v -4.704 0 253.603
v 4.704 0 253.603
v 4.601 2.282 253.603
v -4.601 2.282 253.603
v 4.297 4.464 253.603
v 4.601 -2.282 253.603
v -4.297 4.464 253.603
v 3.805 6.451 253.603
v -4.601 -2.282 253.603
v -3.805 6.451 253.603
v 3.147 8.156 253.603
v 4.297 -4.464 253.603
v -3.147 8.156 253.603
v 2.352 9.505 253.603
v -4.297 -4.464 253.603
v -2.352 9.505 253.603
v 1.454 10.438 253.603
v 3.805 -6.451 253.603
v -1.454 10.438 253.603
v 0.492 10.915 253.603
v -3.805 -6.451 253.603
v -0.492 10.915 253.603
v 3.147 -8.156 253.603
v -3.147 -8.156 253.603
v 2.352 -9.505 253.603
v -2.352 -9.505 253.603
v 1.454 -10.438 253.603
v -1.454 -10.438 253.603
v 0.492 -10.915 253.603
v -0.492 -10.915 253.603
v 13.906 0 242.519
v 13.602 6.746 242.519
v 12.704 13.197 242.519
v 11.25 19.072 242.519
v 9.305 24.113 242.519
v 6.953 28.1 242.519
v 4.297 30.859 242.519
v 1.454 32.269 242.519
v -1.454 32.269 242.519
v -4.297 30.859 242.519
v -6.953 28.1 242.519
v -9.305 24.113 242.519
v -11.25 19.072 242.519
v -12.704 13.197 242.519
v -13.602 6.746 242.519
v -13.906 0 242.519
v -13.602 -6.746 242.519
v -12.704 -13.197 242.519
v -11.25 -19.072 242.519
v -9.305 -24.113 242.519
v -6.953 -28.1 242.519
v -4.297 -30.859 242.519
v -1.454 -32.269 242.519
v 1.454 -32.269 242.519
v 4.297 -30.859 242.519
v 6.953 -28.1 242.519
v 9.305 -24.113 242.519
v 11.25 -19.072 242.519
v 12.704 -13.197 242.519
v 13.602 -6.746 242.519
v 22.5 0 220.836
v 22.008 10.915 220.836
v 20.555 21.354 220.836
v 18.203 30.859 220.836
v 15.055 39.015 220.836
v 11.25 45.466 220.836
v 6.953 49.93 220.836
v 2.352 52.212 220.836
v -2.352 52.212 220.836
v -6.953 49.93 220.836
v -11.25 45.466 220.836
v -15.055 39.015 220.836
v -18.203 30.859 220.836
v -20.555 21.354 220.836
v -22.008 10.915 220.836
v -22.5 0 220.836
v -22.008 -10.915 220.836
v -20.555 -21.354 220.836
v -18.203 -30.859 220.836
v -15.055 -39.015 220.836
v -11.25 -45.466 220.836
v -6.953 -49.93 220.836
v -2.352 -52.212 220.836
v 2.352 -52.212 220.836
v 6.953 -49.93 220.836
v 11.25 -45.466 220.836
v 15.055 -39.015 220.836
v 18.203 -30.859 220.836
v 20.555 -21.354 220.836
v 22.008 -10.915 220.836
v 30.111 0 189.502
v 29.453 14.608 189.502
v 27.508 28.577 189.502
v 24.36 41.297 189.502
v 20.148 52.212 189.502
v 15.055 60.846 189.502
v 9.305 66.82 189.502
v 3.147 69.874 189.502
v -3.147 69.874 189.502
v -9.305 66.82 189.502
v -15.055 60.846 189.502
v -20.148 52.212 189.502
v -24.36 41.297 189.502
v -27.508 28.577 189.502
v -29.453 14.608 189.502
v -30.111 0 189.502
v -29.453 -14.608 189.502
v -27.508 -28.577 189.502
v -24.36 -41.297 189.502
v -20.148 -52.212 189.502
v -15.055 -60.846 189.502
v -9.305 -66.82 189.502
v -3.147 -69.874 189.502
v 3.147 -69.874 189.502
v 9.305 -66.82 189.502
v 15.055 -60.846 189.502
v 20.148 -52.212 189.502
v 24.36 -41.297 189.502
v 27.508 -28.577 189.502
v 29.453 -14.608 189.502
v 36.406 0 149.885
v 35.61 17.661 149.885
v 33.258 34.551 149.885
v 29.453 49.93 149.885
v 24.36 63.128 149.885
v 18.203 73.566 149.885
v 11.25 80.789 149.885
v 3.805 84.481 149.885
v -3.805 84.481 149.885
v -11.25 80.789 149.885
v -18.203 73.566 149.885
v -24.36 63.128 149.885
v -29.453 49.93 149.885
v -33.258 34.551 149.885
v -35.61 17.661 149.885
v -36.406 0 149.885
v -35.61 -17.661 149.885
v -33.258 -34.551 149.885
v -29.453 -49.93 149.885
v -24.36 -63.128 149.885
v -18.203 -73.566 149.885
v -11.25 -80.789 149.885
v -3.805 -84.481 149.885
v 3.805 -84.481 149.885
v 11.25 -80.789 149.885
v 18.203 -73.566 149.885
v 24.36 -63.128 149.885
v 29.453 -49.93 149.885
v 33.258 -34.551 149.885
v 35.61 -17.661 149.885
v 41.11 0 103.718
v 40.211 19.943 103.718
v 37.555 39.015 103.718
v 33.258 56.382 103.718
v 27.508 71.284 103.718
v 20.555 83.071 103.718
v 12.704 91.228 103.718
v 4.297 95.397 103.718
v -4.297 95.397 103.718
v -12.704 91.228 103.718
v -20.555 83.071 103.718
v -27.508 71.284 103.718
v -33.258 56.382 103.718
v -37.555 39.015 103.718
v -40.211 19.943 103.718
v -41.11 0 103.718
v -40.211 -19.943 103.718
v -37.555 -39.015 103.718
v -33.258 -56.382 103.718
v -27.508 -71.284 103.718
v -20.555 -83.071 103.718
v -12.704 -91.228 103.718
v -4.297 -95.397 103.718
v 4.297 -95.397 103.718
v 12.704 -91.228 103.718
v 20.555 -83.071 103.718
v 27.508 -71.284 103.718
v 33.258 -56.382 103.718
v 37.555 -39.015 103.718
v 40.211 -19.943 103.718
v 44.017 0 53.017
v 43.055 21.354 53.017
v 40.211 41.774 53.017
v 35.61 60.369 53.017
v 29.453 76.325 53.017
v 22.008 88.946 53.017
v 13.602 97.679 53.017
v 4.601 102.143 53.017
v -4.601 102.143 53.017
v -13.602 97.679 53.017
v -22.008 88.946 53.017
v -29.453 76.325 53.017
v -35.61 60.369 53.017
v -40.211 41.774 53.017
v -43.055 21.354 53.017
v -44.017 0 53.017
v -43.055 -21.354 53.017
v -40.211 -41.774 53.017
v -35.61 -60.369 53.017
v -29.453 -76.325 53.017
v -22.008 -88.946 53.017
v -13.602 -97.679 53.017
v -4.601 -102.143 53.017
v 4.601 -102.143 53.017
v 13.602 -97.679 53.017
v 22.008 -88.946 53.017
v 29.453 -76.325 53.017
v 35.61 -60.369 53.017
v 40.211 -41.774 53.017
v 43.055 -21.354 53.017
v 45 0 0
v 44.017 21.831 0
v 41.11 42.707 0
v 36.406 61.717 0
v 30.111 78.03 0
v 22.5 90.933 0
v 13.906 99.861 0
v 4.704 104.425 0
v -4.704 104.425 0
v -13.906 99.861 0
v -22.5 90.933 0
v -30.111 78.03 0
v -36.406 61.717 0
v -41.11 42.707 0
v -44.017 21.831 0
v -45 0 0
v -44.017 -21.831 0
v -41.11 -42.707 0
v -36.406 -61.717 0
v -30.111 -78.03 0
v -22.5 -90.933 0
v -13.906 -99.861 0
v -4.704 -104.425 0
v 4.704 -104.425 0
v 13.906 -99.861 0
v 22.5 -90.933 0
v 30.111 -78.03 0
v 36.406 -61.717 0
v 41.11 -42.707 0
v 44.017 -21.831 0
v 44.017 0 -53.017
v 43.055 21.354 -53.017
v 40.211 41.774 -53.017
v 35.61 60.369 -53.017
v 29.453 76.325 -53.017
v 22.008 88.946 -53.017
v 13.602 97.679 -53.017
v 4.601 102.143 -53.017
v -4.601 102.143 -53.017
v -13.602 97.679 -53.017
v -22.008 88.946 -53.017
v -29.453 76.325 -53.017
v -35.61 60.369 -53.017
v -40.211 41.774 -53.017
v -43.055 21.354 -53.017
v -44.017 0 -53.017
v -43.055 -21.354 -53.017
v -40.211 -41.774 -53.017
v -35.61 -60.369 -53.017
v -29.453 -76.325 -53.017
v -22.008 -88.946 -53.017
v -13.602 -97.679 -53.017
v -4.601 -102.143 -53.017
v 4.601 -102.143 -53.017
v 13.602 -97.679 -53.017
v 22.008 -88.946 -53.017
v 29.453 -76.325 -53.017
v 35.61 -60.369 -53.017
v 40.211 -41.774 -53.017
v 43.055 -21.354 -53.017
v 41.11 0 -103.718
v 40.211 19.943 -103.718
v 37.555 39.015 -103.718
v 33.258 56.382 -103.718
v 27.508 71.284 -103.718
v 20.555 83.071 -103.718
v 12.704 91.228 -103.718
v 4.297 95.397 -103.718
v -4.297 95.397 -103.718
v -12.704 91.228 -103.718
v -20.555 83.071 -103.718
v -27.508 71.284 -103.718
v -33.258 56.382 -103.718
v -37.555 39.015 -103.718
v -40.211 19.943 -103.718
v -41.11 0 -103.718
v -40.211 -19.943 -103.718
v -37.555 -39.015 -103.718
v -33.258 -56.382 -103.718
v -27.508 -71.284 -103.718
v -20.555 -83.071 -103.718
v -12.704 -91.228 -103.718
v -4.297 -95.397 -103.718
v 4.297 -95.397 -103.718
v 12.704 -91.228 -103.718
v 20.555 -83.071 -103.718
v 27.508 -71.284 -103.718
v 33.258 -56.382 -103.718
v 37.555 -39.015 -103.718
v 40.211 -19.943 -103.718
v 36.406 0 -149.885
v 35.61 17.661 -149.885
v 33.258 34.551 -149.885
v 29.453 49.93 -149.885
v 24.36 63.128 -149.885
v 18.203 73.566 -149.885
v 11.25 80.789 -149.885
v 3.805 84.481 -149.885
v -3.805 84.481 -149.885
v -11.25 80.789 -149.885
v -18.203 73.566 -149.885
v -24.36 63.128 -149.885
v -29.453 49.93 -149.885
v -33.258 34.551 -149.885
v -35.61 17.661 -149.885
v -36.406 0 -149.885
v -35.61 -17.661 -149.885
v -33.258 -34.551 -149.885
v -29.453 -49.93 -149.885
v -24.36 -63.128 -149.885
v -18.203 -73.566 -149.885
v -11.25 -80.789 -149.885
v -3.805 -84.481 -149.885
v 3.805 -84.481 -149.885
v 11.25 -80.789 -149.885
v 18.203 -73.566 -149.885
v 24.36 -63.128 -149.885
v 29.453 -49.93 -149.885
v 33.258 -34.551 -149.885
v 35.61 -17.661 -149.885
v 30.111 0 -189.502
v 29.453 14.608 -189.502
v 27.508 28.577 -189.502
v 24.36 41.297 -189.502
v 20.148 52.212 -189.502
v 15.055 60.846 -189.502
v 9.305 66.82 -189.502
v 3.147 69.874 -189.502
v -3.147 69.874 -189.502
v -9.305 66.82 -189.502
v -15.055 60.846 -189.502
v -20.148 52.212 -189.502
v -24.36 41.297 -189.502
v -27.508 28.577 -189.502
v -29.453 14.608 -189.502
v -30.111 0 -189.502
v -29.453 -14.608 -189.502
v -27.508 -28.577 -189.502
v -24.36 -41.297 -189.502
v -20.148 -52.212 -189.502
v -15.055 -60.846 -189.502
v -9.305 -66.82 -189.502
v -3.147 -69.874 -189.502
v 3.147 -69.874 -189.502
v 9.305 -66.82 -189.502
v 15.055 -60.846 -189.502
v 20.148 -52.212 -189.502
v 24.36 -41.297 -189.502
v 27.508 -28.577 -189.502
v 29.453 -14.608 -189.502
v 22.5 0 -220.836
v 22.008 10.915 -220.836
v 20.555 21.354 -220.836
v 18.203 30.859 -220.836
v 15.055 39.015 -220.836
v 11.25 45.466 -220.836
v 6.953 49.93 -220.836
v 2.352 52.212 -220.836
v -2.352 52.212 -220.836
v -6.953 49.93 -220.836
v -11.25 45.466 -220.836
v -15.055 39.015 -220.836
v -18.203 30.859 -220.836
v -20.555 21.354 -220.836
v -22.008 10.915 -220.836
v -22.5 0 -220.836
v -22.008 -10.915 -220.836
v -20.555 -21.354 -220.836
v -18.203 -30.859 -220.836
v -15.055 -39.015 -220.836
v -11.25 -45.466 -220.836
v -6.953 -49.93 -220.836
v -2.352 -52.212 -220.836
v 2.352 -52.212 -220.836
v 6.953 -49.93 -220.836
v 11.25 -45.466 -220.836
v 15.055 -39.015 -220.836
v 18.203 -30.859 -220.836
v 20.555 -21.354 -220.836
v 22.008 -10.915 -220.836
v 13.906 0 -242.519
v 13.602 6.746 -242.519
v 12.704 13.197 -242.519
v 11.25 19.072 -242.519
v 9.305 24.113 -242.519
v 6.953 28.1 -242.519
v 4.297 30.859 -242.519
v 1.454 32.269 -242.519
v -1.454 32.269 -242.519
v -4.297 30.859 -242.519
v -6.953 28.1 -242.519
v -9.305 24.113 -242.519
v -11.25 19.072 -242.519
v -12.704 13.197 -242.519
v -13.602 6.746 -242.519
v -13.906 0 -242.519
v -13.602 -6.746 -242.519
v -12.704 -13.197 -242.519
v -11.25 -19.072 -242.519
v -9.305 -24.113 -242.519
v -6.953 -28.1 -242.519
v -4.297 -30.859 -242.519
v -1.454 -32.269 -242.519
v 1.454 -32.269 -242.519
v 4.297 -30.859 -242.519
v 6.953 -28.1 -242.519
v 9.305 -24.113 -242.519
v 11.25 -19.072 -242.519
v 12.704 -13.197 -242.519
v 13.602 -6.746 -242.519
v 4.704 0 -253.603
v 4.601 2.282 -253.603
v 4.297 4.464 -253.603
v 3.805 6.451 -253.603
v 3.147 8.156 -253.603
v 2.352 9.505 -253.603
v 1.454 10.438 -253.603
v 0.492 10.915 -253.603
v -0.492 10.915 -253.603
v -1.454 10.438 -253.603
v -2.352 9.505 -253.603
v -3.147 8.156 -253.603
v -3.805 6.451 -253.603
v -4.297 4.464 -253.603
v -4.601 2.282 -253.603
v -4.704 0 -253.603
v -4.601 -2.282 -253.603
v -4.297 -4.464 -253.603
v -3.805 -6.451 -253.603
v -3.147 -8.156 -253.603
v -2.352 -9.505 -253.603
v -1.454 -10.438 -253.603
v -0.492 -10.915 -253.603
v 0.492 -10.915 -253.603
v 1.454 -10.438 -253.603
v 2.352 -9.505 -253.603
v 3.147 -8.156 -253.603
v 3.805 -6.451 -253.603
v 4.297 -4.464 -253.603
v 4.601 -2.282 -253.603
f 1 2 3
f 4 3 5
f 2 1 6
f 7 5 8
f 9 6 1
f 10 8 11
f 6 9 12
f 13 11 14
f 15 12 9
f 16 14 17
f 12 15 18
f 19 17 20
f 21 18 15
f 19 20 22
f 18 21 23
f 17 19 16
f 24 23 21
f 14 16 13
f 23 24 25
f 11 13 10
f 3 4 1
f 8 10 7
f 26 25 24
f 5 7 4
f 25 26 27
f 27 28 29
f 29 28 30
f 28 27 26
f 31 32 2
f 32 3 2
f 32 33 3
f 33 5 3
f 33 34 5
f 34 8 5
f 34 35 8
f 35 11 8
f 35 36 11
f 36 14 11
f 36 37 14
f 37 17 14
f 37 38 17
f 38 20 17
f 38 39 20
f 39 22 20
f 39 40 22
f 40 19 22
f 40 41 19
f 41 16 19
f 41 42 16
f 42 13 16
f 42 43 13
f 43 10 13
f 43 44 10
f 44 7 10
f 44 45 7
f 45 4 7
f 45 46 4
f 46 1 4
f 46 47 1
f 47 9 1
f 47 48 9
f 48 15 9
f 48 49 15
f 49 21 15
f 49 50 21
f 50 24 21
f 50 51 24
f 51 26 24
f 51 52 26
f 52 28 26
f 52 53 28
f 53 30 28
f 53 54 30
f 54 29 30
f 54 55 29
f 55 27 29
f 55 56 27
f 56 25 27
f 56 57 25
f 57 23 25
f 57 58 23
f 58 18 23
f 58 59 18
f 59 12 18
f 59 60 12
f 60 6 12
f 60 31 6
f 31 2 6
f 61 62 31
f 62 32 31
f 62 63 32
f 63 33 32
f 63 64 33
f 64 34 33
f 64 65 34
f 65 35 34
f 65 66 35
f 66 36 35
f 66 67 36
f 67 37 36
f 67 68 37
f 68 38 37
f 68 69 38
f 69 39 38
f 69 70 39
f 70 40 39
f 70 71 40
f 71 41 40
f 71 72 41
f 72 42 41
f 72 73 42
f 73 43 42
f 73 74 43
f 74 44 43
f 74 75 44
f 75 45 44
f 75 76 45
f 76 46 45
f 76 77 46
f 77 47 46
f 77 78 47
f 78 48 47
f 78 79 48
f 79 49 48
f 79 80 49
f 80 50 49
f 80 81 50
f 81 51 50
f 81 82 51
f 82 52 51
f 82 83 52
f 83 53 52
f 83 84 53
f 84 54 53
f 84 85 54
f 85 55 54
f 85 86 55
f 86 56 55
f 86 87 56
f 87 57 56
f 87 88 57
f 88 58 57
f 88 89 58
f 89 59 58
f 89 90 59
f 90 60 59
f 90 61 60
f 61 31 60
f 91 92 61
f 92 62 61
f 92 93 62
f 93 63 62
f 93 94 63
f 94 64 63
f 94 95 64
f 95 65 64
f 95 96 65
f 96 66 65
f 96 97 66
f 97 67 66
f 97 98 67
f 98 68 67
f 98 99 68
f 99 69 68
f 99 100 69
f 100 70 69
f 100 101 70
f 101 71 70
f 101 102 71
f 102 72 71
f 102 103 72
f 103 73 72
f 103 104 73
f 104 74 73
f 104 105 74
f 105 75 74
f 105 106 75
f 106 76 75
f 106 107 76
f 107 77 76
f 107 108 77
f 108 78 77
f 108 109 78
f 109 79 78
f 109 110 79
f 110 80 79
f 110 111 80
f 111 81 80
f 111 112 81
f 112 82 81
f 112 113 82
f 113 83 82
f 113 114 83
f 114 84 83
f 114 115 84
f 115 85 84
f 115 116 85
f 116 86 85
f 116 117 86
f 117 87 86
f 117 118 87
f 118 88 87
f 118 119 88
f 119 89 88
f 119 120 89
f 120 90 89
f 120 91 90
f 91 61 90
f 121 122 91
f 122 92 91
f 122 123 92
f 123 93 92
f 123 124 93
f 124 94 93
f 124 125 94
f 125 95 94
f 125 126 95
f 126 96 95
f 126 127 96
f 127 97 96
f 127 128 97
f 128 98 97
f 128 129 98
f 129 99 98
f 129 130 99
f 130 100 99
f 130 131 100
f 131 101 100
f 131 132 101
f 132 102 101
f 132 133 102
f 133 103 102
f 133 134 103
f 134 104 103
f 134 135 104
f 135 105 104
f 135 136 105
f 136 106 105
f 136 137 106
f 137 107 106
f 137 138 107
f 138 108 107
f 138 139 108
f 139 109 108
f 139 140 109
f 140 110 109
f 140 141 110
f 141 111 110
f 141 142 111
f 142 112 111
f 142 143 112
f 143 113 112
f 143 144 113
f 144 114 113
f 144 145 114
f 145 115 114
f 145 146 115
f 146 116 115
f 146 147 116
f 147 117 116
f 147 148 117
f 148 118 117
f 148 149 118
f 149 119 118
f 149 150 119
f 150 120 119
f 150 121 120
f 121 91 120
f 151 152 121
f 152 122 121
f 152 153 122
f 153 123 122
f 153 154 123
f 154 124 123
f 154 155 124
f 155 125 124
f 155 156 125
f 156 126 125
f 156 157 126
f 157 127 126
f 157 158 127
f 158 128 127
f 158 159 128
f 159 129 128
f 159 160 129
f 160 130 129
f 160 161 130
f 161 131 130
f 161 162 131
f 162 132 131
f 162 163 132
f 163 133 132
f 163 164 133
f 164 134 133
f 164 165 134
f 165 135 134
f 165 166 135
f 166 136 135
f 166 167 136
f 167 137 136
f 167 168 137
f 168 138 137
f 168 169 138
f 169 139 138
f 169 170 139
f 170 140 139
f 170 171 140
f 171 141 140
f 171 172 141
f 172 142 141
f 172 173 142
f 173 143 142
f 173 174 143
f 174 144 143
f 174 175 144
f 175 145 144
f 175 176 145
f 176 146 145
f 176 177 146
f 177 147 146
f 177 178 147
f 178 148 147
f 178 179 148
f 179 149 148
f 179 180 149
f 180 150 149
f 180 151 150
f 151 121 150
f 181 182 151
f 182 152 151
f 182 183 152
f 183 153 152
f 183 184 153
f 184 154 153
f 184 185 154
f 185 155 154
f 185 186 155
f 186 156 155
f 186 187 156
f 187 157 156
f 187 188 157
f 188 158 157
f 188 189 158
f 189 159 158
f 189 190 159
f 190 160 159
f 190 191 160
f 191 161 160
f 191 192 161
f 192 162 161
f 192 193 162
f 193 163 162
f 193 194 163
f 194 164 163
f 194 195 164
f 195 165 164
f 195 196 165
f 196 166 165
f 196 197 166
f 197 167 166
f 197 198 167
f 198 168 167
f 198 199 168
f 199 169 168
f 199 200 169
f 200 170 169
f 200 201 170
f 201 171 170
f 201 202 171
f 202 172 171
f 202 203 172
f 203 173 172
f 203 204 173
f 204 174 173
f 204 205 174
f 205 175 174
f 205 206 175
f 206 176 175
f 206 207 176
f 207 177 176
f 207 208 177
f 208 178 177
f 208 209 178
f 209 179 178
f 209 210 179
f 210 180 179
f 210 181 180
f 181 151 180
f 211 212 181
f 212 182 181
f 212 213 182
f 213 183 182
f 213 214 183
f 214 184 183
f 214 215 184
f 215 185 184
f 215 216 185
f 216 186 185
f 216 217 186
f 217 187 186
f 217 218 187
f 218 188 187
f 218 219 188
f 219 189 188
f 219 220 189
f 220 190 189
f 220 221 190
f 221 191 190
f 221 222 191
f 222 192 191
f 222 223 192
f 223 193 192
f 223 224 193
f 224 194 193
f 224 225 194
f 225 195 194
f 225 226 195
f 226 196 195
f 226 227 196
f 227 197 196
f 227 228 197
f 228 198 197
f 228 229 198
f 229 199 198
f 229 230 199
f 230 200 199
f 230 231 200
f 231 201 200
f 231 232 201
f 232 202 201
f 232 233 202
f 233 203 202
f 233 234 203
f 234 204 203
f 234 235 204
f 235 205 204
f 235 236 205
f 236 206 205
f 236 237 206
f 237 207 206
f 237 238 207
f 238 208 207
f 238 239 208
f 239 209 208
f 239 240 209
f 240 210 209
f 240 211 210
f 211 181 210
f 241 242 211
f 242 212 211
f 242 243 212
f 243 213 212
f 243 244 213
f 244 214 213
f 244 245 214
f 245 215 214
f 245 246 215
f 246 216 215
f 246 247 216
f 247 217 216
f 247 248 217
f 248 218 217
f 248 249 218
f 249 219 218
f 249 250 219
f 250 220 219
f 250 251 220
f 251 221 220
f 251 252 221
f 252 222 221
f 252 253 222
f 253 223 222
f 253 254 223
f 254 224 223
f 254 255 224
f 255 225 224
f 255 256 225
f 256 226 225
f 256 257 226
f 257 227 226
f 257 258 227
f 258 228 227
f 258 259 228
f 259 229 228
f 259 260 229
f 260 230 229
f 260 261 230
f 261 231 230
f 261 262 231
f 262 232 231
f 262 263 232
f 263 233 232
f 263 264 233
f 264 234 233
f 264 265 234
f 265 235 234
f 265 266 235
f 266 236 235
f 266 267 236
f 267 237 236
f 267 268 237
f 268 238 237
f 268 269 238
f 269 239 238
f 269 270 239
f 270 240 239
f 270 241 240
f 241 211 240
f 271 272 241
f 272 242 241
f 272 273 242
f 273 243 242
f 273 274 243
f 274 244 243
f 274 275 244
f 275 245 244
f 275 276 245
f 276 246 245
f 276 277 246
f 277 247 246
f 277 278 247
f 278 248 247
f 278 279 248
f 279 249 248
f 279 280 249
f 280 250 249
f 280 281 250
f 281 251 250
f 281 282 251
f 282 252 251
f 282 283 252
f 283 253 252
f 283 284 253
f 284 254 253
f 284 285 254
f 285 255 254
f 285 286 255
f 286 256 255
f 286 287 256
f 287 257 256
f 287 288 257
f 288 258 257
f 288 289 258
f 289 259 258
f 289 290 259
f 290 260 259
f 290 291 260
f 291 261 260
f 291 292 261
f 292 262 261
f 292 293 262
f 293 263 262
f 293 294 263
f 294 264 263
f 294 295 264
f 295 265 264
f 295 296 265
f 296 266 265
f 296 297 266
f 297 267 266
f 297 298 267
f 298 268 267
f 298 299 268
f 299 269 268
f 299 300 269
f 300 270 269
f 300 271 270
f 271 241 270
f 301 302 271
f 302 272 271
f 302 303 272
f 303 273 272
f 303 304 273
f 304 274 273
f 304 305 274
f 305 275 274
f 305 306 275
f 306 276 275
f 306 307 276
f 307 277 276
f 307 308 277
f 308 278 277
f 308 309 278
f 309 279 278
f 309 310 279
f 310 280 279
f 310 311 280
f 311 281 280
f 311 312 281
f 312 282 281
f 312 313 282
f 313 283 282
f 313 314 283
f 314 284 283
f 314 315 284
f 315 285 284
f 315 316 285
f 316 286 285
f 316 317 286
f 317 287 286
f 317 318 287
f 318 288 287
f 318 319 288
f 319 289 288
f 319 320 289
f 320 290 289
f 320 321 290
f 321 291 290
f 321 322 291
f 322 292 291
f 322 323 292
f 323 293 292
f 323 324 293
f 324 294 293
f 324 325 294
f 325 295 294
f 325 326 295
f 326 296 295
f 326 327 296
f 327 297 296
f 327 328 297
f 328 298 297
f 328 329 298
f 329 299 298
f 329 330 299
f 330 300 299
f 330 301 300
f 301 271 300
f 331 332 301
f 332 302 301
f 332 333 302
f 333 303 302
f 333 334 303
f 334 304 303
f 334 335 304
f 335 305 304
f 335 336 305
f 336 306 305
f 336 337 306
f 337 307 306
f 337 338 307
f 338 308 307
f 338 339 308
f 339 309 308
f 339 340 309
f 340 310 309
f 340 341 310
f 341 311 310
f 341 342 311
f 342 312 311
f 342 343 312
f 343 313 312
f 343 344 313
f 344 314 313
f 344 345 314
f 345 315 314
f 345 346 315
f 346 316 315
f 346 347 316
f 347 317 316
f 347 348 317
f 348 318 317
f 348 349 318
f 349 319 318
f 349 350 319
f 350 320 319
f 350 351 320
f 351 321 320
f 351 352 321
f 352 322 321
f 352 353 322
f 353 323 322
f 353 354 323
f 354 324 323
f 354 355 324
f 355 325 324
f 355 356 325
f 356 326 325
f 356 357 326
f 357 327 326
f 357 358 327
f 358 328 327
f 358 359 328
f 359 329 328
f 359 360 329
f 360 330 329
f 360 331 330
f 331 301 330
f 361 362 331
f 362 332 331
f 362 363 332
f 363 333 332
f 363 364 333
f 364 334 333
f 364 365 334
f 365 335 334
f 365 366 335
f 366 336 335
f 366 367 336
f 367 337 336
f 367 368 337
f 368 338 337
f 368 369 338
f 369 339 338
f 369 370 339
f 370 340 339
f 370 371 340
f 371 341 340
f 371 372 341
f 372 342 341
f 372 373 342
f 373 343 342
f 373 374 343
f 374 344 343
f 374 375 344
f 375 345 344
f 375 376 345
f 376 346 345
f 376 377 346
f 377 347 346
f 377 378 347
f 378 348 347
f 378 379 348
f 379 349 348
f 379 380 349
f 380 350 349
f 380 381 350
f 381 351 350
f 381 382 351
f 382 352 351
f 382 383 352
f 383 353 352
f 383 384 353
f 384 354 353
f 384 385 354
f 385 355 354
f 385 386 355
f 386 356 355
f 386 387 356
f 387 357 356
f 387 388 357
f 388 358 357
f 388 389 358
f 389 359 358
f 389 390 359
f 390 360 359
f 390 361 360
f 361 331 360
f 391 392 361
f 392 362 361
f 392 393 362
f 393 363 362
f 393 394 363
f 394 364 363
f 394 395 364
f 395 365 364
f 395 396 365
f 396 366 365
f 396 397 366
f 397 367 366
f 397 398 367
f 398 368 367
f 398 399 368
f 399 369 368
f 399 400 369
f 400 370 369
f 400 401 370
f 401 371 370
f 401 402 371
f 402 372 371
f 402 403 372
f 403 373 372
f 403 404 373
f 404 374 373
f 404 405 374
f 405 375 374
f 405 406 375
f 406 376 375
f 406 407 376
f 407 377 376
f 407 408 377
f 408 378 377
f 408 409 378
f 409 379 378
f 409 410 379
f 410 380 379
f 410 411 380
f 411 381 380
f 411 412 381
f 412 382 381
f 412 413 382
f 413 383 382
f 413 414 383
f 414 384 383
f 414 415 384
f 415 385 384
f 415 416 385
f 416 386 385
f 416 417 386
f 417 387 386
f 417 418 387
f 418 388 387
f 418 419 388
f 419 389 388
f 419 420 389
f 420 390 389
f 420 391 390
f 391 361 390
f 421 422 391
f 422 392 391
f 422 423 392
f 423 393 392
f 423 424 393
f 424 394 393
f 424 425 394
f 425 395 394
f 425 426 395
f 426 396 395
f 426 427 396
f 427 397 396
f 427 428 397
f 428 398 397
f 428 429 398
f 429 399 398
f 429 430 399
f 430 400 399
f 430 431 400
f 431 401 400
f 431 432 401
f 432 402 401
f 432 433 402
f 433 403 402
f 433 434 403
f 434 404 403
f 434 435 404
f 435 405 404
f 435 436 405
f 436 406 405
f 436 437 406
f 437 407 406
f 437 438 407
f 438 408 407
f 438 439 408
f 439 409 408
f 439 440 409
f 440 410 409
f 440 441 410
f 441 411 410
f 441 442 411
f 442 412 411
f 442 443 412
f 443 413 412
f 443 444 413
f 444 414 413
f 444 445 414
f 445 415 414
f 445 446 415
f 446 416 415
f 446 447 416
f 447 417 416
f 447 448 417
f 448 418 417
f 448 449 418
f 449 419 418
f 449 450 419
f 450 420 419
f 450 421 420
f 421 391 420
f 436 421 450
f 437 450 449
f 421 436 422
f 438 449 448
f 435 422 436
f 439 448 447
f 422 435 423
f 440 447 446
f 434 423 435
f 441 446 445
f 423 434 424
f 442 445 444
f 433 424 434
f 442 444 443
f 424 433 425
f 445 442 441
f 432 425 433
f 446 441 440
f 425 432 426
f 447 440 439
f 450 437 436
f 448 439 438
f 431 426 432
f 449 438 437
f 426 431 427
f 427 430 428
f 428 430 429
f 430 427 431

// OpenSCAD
// Generated by SolidPython 1.0.1 on 2020-07-29 00:46:45


scale(v = [3, 7, 17]) {
	sphere(r = 15);
}
/***********************************************
*********      SolidPython code:      **********
************************************************
 
# import packages: SolidPython
from solid import *
from solid.utils import *
from itertools import chain, combinations, permutations


class Resize:

    def __init__(self, scad_file):
        self.scad_file = scad_file
        #self.scad_file = import_scad(scad_file)
        # cone/cylinder param:
        self.r1 = 0
        self.r2 = 0
        self.h = 0
        # rectangular prism param:
        self.w = 0
        self.l = 0
        # ellipse param:
        self.r = 0

    # import OpenScad code (file name corresponds to shape)


    # classify shape + parameters
    def assign(self, param1, param2, param3):
        if self.scad_file == 'cone.scad':
            self.r1 = param1
            self.r2 = param2
            self.h = param3
        elif self.scad_file == 'cylinder.scad':
            self.r1 = param1
            self.r2 = param2
            self.h = param3
        elif self.scad_file == 'rectangularPrism.scad':
            self.h = param1
            self.l = param2
            self.w = param3
        else:
            self.r = param1
            self.h = param2

    # resize parameters
    def iterate(self):
        x = range(3, 20, 2)
        i = 1
        if self.scad_file == 'cone.scad':
            tempList = list(permutations(x, 2))
            for temp in tempList:
                param1 = temp[0]
                param2 = temp[1]
                filepath = 'produced_scad_files/' + 'cone' + str(param1) + '_' + str(param2) + '_' + '.scad'
                scad_render_to_file(cylinder(h=param1, r1=param2, r2=0), filepath)

        elif self.scad_file == 'cylinder.scad':
            tempList = list(permutations(x, 3))
            for temp in tempList:
                param1 = temp[0]
                param2 = temp[1]
                filepath = 'produced_scad_files/' + 'cylinder' + str(param1) + '_' + str(param2) + '_' + '.scad'
                scad_render_to_file(cylinder(h=param1, r1=param2, r2=param2), filepath)

        elif self.scad_file == 'rectangularPrism.scad':
            tempList = list(permutations(x, 3))
            for temp in tempList:
                param1 = temp[0]
                param2 = temp[1]
                param3 = temp[2]
                filepath = 'produced_scad_files/' + 'rectangularPrism' + str(param1) + '_' + str(param2) + '_' + str(
                    param3) + '.scad'
                scad_render_to_file(cube(size=(param1, param2, param3)), filepath)

        elif self.scad_file == 'ellipse.scad':
            tempList = list(permutations(x, 4))
            for temp in tempList:
                param1 = temp[0]
                param2 = temp[1]
                param3 = temp[2]
                param4 = temp[3]
                filepath = 'produced_scad_files/' + 'ellipse' + str(param1) + '_' + str(param2) + '_' + str(param3) + '_' + str(param4) + '.scad'
                scad_render_to_file(scale([param1, param2, param3])(sphere(r=param4)), filepath)

    def render_to_scadfile(self):
        scad_render_to_file(scad, 'example.scad') 
 
************************************************/
